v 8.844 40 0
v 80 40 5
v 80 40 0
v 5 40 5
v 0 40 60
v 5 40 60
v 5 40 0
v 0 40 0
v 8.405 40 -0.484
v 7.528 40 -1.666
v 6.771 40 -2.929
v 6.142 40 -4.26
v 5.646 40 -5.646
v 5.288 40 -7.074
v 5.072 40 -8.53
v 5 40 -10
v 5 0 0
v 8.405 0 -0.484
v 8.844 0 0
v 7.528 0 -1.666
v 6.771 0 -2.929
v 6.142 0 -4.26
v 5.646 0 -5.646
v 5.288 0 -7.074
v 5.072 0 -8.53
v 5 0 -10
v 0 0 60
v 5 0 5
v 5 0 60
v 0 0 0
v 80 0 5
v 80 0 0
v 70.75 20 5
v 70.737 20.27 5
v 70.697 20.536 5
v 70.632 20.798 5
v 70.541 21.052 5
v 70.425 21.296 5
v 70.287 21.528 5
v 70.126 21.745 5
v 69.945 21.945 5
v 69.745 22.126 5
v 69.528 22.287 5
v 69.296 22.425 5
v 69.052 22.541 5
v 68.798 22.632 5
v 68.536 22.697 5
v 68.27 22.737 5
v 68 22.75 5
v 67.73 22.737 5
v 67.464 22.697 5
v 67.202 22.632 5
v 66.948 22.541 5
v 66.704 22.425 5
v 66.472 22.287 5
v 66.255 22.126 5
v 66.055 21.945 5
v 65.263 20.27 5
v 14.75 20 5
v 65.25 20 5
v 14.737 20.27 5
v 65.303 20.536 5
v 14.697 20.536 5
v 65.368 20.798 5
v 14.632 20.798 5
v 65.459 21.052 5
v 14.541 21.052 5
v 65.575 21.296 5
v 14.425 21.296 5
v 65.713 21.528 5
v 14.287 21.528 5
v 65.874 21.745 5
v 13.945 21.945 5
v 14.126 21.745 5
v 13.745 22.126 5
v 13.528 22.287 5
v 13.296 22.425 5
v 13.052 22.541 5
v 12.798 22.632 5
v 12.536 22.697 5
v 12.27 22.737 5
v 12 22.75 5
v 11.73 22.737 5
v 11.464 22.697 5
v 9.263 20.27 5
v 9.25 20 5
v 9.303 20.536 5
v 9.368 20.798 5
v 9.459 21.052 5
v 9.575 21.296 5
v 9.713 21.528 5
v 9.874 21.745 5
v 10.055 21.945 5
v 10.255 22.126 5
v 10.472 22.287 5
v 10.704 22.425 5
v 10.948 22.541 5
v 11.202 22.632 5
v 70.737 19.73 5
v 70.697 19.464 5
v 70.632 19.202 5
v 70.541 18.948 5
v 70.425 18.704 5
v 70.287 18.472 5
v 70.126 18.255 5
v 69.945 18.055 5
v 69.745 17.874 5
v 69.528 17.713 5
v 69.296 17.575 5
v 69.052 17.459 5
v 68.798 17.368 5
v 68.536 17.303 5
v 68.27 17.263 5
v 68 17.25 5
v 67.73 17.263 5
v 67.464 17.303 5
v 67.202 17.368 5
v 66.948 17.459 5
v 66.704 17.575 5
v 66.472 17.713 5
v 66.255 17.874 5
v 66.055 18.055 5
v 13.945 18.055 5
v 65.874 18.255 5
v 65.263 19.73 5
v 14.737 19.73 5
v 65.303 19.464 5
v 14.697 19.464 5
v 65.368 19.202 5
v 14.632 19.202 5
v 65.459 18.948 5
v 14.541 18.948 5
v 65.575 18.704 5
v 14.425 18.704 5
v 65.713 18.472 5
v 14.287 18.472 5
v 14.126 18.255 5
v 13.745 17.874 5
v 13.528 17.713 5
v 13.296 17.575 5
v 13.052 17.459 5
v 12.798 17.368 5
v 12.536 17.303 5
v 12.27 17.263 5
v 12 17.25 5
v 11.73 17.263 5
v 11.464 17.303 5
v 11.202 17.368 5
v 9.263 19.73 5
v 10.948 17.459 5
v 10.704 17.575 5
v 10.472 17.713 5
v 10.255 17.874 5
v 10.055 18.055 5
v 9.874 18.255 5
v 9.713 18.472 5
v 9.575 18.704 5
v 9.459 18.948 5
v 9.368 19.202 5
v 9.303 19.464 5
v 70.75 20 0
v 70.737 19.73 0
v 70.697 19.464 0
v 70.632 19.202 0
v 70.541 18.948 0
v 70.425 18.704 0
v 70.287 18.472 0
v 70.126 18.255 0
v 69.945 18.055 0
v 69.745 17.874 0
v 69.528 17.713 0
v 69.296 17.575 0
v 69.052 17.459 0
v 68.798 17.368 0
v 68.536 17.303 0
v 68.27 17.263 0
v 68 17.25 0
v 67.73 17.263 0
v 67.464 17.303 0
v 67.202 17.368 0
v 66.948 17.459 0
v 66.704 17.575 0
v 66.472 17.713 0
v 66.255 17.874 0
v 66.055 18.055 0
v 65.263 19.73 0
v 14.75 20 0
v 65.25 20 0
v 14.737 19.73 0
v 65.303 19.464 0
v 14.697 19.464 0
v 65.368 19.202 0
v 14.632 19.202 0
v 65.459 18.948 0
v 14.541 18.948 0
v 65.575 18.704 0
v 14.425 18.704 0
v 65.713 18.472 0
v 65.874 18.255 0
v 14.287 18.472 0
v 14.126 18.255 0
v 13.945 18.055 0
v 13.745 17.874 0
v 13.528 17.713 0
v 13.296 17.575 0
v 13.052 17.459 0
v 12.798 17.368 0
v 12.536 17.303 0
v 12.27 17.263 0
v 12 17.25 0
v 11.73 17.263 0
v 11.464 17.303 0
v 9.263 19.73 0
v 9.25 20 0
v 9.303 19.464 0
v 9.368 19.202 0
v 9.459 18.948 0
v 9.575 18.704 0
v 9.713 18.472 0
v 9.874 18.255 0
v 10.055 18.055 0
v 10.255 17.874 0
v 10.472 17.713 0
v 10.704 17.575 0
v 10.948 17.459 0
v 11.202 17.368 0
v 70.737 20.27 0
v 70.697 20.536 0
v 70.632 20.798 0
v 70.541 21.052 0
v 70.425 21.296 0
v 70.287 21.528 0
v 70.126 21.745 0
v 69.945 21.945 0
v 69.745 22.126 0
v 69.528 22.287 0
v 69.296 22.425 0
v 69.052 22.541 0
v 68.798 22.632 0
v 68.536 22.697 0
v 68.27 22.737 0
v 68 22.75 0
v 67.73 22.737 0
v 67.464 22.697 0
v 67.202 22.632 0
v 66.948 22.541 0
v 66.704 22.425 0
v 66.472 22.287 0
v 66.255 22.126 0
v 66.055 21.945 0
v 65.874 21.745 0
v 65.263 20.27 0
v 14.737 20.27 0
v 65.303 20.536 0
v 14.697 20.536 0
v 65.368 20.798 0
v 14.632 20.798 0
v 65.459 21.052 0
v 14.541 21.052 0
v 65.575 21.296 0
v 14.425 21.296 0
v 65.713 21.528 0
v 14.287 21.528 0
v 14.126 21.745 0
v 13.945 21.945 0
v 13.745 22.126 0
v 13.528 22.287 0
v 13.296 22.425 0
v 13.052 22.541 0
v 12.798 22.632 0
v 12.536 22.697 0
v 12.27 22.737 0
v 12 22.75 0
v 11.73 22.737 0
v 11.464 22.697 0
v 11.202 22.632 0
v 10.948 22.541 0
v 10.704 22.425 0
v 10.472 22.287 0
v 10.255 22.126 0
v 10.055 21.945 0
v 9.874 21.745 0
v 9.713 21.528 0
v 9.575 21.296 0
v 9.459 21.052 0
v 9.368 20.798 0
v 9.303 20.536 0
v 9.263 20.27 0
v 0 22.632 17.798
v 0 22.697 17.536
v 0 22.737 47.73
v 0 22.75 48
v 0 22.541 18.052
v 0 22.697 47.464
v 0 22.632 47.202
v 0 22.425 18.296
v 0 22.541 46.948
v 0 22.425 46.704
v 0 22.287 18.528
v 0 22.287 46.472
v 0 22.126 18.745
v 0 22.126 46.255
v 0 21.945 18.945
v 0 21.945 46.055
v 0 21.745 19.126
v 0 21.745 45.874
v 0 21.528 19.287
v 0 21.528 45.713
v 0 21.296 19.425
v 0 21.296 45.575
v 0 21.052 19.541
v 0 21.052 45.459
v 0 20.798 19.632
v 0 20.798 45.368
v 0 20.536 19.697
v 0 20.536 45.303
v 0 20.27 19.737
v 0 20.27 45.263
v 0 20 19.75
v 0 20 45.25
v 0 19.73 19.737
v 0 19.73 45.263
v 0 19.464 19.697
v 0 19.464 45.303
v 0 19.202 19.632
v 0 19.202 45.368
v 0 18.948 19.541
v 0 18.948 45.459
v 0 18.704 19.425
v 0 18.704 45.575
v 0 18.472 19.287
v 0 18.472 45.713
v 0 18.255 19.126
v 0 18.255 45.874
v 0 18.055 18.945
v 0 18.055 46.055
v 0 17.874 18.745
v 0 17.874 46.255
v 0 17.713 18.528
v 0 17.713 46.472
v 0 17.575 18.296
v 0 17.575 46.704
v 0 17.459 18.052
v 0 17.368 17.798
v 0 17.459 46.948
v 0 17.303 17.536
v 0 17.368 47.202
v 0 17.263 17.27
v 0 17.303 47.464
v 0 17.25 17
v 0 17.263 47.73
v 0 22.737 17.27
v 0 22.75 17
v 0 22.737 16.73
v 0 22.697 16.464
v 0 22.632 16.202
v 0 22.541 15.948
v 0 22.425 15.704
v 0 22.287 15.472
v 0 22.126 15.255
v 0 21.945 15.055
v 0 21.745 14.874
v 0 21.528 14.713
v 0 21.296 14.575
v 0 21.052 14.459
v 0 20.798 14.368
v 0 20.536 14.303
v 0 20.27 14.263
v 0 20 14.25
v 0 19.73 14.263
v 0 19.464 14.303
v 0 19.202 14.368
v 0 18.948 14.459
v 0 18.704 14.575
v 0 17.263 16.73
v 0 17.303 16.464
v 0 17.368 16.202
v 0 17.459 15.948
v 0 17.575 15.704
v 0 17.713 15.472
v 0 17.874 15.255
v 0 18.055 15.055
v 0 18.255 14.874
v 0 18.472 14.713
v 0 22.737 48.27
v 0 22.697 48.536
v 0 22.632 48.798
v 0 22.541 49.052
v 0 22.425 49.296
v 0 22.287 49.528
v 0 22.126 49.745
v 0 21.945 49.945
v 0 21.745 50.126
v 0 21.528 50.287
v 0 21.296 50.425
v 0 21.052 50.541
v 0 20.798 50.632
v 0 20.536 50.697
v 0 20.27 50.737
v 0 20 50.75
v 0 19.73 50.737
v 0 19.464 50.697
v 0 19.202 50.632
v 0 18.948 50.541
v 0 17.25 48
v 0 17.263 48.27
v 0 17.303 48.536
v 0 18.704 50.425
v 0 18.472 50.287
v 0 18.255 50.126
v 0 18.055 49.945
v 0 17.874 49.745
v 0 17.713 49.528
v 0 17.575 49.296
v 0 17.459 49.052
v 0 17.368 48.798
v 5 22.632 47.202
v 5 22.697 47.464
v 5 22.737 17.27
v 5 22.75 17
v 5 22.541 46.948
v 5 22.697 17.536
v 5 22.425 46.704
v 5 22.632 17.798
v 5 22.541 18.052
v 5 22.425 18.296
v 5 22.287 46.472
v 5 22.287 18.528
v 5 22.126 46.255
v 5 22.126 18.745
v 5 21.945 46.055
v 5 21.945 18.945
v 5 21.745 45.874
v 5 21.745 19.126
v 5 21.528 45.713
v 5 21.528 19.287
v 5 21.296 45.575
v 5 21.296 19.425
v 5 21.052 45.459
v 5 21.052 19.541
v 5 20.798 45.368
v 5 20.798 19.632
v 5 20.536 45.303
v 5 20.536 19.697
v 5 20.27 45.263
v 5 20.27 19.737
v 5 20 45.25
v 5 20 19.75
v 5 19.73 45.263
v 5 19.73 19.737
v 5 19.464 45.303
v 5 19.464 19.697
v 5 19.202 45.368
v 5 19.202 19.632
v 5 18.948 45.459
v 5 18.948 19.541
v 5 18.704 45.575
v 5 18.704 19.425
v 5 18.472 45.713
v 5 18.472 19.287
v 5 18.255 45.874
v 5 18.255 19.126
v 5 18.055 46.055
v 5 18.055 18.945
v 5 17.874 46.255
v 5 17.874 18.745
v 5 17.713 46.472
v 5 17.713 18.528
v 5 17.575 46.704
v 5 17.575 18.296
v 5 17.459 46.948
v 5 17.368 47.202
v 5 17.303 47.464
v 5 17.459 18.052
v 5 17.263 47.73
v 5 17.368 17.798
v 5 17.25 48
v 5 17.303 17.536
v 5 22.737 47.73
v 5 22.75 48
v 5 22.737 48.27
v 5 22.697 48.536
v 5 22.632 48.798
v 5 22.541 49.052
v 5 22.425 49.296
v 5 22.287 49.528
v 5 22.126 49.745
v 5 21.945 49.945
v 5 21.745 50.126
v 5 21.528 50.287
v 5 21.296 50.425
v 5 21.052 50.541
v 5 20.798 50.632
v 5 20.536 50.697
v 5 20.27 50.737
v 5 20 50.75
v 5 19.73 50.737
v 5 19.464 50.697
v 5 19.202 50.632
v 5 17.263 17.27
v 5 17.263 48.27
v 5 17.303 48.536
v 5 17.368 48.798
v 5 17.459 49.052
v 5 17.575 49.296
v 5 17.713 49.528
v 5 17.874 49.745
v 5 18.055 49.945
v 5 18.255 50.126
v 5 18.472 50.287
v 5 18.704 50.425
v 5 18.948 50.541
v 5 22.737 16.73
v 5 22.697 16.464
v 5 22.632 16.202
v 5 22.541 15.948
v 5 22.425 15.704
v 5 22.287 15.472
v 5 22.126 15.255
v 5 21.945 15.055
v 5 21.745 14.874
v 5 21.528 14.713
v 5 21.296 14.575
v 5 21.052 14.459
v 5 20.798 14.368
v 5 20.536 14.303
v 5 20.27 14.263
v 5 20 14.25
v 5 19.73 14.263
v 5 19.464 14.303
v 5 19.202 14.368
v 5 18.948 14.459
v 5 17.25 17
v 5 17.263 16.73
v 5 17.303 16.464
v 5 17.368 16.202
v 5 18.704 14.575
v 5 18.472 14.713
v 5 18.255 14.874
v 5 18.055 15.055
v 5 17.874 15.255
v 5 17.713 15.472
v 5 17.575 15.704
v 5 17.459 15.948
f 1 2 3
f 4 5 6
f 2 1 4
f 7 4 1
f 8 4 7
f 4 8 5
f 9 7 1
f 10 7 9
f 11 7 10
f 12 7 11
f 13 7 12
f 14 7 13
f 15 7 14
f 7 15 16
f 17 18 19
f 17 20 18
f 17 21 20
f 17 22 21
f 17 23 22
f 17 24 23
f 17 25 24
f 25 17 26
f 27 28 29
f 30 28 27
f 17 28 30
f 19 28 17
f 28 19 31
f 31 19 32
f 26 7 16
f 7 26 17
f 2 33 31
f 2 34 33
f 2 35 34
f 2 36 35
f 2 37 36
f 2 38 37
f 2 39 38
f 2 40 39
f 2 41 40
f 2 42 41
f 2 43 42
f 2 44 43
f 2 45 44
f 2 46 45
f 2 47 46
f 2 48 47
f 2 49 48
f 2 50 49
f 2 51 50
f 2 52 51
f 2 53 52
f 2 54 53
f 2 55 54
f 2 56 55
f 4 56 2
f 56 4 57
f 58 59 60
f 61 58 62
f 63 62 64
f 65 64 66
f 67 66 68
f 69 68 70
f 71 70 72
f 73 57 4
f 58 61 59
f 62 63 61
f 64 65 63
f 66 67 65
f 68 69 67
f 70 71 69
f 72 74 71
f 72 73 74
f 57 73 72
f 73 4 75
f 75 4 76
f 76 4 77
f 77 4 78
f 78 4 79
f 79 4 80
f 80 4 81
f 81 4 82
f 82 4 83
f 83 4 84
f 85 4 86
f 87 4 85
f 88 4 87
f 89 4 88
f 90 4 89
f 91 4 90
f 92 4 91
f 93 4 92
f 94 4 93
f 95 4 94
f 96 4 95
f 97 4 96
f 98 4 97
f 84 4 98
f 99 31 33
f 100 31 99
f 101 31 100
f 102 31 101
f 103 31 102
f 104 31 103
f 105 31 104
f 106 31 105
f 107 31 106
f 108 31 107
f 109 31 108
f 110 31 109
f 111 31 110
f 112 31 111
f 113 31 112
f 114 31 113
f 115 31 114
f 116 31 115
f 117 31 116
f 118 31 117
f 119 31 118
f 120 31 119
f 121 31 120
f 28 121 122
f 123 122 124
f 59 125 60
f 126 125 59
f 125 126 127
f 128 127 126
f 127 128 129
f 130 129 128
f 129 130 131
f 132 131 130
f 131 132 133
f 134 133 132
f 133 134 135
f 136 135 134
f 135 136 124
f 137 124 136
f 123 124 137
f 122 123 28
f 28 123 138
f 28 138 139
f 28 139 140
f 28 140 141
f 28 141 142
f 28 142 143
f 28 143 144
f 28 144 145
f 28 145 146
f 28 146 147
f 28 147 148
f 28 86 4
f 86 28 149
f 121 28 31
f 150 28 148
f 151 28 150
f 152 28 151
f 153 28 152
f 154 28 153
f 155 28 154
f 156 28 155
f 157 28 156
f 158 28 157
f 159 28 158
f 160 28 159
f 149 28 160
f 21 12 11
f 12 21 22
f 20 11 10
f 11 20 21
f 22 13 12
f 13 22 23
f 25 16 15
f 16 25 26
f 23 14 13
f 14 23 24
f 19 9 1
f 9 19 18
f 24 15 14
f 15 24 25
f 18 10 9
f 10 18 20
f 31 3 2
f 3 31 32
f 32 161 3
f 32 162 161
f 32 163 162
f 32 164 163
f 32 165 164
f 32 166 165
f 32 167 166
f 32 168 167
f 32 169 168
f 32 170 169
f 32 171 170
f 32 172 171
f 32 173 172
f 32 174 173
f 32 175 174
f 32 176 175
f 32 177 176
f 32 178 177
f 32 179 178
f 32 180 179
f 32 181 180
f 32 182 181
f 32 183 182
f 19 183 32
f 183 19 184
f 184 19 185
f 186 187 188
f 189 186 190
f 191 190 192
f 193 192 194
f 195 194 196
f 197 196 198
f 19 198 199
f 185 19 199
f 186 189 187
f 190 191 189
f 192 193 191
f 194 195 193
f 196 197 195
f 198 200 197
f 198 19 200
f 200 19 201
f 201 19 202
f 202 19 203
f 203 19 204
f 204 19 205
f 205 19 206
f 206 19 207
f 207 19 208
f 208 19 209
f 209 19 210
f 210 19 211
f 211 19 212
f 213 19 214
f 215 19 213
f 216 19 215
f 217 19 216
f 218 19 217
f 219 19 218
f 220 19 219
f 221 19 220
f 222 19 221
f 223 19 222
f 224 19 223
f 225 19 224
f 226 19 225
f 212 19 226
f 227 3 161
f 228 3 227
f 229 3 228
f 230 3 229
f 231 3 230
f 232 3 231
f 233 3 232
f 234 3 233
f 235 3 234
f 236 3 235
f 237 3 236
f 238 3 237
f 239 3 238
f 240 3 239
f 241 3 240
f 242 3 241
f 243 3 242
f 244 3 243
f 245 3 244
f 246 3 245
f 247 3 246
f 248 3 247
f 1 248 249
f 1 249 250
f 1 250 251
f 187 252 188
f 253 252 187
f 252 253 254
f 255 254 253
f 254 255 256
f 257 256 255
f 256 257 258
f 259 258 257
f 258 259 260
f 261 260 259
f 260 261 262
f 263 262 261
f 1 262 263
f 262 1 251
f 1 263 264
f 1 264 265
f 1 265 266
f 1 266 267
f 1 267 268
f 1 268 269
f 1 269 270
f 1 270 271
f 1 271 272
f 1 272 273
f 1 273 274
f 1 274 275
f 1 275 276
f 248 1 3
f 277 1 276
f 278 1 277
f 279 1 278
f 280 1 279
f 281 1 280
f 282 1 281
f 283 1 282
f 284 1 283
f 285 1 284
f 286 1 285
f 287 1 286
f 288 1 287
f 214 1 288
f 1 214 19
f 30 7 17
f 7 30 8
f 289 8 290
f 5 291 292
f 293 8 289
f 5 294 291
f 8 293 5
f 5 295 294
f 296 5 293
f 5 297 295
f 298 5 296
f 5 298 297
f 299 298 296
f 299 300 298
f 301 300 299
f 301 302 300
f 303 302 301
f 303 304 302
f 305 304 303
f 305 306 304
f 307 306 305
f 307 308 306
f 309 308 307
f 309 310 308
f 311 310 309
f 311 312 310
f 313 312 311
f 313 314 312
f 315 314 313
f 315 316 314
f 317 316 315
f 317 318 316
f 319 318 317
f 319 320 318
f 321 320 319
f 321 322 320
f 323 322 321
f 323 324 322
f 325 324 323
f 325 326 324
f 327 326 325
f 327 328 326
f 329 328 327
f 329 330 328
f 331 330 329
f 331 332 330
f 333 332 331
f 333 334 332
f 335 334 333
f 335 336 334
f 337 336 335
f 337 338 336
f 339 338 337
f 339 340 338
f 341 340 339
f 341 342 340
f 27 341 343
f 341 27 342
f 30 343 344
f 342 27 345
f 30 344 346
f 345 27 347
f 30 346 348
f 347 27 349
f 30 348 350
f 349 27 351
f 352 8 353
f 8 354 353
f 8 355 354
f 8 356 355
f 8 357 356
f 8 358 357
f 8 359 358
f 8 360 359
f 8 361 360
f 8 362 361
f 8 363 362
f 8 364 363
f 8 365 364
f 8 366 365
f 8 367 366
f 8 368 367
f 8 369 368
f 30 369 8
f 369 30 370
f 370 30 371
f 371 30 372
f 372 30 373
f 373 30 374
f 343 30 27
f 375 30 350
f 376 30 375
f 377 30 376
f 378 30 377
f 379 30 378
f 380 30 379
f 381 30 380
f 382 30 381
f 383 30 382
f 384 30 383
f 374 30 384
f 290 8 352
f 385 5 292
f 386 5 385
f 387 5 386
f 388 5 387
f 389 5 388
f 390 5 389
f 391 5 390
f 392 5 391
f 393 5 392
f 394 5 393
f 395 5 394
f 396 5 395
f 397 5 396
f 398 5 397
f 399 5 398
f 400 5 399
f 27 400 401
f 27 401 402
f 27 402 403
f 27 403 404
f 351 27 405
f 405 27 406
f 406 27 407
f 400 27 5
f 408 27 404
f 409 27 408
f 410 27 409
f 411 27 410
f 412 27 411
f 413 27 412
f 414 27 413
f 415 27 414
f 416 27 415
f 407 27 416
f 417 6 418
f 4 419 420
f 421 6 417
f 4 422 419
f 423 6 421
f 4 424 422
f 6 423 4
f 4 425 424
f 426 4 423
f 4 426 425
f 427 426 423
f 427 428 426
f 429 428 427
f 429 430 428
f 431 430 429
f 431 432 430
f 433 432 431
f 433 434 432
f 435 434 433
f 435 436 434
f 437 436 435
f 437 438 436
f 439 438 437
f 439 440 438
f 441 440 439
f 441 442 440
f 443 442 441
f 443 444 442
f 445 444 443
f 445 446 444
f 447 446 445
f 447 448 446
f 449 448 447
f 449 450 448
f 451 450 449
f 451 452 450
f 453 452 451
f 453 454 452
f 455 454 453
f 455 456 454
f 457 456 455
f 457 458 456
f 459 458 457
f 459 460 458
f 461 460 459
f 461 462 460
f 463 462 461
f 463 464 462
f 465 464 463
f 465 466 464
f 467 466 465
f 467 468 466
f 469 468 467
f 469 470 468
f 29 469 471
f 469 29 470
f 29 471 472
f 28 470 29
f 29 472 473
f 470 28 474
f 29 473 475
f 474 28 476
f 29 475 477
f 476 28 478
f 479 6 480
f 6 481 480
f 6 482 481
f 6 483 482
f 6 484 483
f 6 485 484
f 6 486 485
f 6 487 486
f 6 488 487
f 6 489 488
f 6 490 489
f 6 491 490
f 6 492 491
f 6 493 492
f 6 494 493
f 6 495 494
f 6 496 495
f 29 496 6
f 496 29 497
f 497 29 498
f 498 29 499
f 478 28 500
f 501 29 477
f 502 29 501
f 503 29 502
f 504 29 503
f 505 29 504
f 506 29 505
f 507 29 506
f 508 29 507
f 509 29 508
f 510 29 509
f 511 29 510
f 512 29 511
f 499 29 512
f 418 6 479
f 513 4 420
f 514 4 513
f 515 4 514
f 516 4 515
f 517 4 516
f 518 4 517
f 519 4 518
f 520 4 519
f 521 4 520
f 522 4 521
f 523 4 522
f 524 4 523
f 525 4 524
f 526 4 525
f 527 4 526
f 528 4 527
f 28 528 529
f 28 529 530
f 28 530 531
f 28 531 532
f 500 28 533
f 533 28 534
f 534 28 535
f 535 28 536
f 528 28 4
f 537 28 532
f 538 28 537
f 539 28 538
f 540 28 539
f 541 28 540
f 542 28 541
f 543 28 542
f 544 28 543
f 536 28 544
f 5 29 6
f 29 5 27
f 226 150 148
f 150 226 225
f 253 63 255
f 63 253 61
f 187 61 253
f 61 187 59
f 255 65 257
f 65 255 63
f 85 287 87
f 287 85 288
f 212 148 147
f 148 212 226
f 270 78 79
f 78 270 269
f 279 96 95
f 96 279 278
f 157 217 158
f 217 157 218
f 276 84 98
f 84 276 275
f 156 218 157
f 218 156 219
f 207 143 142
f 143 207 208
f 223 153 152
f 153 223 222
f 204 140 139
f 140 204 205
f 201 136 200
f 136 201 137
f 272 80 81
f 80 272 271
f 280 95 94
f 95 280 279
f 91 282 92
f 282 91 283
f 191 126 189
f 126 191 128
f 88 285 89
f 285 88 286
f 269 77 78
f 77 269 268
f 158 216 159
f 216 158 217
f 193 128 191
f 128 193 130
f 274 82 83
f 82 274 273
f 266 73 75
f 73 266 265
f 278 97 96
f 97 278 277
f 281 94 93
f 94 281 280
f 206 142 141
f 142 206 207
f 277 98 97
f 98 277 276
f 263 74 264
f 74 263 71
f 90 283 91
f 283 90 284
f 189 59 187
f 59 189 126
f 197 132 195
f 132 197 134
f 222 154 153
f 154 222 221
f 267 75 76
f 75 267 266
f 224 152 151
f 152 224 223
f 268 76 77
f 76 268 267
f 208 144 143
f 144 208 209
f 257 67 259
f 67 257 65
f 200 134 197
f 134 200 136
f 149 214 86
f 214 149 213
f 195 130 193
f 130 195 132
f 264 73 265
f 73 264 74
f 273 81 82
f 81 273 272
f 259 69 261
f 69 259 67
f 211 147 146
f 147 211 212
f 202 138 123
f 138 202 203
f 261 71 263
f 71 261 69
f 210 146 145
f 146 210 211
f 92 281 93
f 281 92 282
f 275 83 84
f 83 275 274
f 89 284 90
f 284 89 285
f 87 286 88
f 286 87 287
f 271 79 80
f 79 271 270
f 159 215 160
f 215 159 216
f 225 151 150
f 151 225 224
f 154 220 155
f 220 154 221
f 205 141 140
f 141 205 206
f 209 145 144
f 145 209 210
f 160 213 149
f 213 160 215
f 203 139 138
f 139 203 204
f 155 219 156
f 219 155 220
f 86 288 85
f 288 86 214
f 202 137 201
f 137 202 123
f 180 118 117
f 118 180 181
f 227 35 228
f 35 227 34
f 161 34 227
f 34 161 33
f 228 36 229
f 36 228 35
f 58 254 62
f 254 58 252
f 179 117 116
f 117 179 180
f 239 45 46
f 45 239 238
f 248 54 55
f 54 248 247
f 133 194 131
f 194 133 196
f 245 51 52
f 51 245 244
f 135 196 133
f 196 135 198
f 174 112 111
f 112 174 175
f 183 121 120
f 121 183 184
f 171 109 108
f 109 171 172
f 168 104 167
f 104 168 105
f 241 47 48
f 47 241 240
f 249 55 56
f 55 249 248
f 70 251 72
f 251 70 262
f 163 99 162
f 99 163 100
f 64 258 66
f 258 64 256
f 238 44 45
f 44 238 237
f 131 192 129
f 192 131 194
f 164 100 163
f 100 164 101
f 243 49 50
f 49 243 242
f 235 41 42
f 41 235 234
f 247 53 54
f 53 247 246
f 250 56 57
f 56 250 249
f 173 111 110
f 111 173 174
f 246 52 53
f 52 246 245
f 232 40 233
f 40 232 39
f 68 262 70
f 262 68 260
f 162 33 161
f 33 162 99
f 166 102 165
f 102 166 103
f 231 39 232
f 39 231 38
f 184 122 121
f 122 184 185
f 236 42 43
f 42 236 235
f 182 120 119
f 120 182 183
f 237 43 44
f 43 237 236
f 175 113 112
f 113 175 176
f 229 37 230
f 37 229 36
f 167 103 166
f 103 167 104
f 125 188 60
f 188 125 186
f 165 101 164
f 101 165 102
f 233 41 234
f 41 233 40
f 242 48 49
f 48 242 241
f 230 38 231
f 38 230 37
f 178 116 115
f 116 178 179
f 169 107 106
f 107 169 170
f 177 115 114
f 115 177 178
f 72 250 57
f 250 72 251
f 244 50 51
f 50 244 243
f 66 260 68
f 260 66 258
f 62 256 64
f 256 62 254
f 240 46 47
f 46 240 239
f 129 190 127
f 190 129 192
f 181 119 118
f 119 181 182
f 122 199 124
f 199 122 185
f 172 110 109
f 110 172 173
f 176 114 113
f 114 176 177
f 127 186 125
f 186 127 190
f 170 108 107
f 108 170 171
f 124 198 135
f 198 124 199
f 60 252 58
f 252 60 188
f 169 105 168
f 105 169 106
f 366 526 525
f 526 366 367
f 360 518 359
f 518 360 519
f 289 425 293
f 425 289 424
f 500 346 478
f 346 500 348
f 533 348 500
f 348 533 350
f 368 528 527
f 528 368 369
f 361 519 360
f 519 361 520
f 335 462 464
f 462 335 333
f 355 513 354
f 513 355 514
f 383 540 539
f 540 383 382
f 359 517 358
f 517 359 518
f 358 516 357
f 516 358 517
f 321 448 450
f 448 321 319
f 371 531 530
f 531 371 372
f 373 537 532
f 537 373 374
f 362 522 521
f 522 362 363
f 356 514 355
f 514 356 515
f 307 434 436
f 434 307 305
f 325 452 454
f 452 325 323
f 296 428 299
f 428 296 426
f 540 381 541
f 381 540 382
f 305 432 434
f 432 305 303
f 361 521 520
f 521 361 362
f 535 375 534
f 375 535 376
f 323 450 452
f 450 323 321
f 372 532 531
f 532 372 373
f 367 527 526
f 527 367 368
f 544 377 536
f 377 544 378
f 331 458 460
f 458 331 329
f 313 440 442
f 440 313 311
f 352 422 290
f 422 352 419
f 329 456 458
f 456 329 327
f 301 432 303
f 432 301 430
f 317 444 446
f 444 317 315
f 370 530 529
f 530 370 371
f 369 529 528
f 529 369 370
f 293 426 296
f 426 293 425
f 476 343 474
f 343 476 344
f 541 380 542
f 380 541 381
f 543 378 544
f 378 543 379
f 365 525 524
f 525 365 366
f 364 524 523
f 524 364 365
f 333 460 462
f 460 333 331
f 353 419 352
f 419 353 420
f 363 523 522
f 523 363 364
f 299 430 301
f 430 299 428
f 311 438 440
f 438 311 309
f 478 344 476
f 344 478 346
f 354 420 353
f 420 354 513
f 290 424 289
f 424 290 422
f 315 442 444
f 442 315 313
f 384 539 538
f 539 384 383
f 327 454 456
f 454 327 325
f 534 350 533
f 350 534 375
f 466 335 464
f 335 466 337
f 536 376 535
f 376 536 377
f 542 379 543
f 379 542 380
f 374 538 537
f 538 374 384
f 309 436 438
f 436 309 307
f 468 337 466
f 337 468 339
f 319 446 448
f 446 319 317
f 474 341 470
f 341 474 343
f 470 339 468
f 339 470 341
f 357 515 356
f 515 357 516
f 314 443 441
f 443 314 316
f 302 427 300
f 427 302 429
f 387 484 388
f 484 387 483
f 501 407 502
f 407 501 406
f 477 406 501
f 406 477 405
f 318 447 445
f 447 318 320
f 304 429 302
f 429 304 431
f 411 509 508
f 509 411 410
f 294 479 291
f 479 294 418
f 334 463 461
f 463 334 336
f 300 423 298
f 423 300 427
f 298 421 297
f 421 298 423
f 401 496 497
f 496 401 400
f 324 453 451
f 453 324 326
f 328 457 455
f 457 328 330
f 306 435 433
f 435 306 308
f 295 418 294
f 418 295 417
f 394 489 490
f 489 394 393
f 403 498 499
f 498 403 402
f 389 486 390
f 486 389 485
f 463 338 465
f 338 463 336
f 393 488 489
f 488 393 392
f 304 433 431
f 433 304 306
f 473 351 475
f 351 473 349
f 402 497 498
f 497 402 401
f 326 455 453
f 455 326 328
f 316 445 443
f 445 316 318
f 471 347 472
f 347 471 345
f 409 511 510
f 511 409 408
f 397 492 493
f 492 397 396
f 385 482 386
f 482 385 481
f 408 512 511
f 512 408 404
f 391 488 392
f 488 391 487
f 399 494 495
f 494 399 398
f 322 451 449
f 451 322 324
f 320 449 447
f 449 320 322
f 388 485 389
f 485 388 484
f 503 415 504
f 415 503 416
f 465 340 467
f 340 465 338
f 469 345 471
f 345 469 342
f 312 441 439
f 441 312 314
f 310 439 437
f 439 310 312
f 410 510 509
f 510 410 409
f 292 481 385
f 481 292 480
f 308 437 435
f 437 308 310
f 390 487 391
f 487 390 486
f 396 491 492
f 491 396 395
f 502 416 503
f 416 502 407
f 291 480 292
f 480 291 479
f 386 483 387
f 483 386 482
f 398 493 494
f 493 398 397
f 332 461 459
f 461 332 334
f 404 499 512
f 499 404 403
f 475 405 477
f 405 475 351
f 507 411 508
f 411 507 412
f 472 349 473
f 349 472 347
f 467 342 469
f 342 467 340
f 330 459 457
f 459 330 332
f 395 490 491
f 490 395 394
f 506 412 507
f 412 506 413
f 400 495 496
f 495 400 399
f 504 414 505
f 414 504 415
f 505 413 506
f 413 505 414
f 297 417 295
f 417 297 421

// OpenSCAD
// Parametric Mounting Bracket
// A configurable L-bracket with mounting holes and fillet reinforcement.
// All dimensions in mm.

/* [Main Dimensions] */
base_length = 80;       // Length of the horizontal base
base_width  = 40;       // Width (depth) of the bracket
wall_height = 60;       // Height of the vertical wall
thickness   = 5;        // Material thickness

/* [Mounting Holes] */
hole_diameter   = 5.5;  // M5 clearance holes
hole_inset      = 12;   // Distance from edges to hole centers
num_base_holes  = 2;    // Holes along the base
num_wall_holes  = 2;    // Holes on the vertical wall

/* [Reinforcement] */
fillet_radius   = 15;   // Corner fillet radius
gusset_size     = 20;   // Triangular gusset reinforcement size

/* [Rendering] */
$fn = 64;               // Facet count for smooth curves

module base_plate() {
    cube([base_length, base_width, thickness]);
}

module vertical_wall() {
    translate([0, 0, thickness])
        cube([thickness, base_width, wall_height - thickness]);
}

module fillet_reinforcement() {
    translate([thickness, 0, thickness])
        rotate([-90, 0, 0])
            difference() {
                cube([fillet_radius, fillet_radius, base_width]);
                translate([fillet_radius, fillet_radius, -1])
                    cylinder(r=fillet_radius, h=base_width + 2);
            }
}

module gusset() {
    translate([thickness, 0, thickness])
        linear_extrude(height=base_width)
            polygon(points=[
                [0, 0],
                [gusset_size, 0],
                [0, gusset_size]
            ]);
    
    // Mirror gusset on the other side
    translate([thickness, base_width, thickness])
        rotate([90, 0, 0])
            linear_extrude(height=base_width)
                polygon(points=[
                    [0, 0],
                    [gusset_size, 0],
                    [0, gusset_size]
                ]);
}

module base_holes() {
    for (i = [0 : num_base_holes - 1]) {
        x = hole_inset + i * (base_length - 2 * hole_inset) / max(num_base_holes - 1, 1);
        translate([x, base_width / 2, -1])
            cylinder(d=hole_diameter, h=thickness + 2);
    }
}

module wall_holes() {
    for (i = [0 : num_wall_holes - 1]) {
        z = thickness + hole_inset + i * (wall_height - thickness - 2 * hole_inset) / max(num_wall_holes - 1, 1);
        translate([-1, base_width / 2, z])
            rotate([0, 90, 0])
                cylinder(d=hole_diameter, h=thickness + 2);
    }
}

// --- Assembly ---
module bracket() {
    difference() {
        union() {
            base_plate();
            vertical_wall();
            fillet_reinforcement();
        }
        base_holes();
        wall_holes();
    }
}

bracket();

// Uncomment below to render a mirrored pair:
// translate([base_length + 10, 0, 0])
//     mirror([1, 0, 0]) bracket();
